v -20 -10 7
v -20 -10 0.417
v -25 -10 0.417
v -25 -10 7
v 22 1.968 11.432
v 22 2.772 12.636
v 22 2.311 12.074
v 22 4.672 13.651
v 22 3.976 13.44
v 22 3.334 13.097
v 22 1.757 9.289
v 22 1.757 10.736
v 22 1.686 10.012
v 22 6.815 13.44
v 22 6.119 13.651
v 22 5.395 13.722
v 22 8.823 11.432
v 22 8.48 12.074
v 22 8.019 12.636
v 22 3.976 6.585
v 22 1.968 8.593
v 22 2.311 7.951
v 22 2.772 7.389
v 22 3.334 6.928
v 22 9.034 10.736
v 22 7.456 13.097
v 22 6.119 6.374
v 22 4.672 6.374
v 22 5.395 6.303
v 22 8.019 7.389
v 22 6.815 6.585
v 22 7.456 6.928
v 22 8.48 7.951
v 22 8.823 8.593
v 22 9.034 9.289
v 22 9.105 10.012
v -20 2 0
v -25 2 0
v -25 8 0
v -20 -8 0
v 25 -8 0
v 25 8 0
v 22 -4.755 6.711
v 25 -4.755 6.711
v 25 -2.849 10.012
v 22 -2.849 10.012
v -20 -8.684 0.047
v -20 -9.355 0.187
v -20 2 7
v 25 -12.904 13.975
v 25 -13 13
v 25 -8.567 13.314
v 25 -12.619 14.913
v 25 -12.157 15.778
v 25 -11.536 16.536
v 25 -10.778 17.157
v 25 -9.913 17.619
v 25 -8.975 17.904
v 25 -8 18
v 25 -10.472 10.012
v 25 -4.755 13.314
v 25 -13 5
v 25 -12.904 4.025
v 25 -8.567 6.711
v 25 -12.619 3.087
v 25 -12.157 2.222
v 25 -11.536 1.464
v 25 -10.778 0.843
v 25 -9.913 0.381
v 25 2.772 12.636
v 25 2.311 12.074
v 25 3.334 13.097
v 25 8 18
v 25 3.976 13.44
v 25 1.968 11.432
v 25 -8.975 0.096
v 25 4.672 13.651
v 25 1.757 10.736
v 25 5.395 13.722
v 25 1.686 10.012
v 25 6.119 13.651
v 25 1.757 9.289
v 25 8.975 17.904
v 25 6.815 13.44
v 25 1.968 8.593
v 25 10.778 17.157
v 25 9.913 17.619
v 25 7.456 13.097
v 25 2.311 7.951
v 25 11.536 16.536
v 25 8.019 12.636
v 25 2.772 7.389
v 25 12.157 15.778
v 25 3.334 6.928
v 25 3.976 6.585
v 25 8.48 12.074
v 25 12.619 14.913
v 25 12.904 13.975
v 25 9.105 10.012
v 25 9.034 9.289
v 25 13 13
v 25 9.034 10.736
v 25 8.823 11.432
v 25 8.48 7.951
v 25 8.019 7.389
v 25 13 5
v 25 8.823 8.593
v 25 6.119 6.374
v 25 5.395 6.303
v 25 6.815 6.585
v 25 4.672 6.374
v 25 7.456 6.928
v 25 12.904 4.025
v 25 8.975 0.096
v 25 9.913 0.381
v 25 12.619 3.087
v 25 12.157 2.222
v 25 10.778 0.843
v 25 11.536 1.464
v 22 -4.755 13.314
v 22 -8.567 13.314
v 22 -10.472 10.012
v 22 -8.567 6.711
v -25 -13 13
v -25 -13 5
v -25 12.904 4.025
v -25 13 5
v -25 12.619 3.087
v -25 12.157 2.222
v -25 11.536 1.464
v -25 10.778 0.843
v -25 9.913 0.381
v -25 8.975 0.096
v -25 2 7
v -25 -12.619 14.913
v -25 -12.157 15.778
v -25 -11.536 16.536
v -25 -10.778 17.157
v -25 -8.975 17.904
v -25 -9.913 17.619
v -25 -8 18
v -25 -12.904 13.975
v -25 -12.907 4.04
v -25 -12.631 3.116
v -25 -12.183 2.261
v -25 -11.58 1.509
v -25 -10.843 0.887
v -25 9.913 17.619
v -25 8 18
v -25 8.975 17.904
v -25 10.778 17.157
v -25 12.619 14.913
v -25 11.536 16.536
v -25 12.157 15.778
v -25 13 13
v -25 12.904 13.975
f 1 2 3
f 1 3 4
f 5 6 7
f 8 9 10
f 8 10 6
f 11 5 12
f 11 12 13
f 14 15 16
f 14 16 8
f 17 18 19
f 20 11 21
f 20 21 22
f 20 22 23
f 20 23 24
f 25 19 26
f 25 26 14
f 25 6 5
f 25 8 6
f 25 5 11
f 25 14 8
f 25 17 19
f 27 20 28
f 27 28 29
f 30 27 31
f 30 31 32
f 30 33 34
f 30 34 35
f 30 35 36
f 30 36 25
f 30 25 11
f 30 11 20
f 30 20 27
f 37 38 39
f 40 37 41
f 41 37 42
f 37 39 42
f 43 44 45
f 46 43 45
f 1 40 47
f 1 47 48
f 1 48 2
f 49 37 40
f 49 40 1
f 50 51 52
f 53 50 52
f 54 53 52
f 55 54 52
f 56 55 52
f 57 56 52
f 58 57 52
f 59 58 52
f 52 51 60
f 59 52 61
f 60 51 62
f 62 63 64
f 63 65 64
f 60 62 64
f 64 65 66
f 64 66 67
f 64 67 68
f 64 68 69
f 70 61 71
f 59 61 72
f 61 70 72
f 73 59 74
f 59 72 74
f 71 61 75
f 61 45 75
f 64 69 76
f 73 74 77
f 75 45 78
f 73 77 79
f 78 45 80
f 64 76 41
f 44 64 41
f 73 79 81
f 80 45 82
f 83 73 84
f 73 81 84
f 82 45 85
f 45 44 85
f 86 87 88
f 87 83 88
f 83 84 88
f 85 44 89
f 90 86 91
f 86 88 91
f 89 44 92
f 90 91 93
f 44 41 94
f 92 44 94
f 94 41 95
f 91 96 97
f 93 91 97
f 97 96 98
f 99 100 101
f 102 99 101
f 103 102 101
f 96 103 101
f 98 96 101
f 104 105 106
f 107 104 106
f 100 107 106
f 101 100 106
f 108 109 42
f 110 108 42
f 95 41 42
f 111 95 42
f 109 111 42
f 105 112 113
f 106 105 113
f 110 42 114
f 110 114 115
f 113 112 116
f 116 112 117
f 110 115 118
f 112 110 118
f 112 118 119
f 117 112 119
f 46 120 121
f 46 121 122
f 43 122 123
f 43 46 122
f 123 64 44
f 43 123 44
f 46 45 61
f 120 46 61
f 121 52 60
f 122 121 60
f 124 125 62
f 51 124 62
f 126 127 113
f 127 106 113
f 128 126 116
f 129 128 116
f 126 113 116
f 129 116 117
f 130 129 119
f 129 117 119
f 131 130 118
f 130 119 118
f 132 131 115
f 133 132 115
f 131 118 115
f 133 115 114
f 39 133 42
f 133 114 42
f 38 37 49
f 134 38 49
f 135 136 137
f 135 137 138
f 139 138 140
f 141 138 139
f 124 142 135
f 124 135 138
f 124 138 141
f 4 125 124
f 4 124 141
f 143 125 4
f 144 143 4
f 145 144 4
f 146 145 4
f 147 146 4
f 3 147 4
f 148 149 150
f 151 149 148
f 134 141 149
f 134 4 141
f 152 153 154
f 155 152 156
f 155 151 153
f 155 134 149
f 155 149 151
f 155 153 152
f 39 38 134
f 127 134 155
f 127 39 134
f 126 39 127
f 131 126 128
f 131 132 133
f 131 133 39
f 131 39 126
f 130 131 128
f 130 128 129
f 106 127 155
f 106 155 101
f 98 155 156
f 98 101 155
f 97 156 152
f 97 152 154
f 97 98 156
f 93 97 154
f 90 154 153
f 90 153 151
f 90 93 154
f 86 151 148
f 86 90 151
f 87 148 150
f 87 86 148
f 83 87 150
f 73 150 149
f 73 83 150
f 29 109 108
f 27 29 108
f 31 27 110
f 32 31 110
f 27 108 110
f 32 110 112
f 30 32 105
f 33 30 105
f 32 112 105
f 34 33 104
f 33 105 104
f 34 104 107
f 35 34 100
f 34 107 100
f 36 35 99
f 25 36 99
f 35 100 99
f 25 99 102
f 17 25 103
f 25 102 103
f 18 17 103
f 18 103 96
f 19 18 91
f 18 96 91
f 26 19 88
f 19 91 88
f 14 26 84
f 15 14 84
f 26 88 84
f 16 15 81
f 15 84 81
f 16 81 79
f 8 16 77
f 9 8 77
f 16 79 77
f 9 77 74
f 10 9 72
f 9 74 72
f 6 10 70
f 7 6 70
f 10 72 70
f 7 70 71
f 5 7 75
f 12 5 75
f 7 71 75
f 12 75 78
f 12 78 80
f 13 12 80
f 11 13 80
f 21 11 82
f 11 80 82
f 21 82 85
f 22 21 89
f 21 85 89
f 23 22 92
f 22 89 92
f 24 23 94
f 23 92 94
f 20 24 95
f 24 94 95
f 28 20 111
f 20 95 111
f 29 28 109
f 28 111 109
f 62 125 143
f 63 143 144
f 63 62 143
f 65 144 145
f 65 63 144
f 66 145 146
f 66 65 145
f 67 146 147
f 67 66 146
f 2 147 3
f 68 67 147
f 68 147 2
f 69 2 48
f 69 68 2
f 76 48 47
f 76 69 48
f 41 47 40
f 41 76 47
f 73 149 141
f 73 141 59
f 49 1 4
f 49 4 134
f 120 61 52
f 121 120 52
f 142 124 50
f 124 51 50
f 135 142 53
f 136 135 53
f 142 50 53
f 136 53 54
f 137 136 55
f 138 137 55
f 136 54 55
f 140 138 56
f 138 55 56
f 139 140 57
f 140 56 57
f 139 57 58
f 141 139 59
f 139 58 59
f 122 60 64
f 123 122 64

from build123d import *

# Parameters (mm, degrees)
SKETCH1_W           = 50
SKETCH1_H           = 26
BOSS_EXTRUDE1_DEPTH = 18
SKETCH2_R           = 3.709825946
CUT_EXTRUDE1_DEPTH  = 3
FILLET1_R           = 5
CUT_EXTRUDE4_START  = -5
SKETCH3_W           = 7
SKETCH3_H           = 6
CUT_EXTRUDE4_DEPTH  = 5


with BuildPart() as part:
    # Sketch1 → Boss-Extrude1 (new body)
    with BuildSketch(Plane.XY):
        Rectangle(SKETCH1_W, SKETCH1_H)
    extrude(amount=BOSS_EXTRUDE1_DEPTH)

    # Sketch2 → Cut-Extrude1 (cut)
    with BuildSketch(Plane(origin=(25, 0, 0), x_dir=(0, 0, -1), z_dir=(1, 0, 0))):
        with Locations((-10.012439419, 5.395426064)):
            Circle(SKETCH2_R)
        Polygon((-10.012439419, -2.84865676), (-13.313646894, -4.754609784), (-13.313646894, -8.566515832), (-10.012439419, -10.472468856), (-6.711231945, -8.566515832), (-6.711231945, -4.754609784), align=None)
    extrude(amount=-CUT_EXTRUDE1_DEPTH, mode=Mode.SUBTRACT)

    # Fillet1
    fillet1_edges = [part.edges().sort_by_distance(p)[0] for p in [
        (0, -13, 18),
        (0, -13, 0),
        (0, 13, 0),
        (0, 13, 18),
    ]]
    fillet(fillet1_edges, radius=FILLET1_R)

    # Sketch3 → Cut-Extrude4 (cut)
    with BuildSketch(Plane.ZY.offset(25).offset(CUT_EXTRUDE4_START)):
        with BuildLine():
            Line((7, -4), (0, -4))
            Line((0, -4), (0, -8))
            ThreePointArc((0, -8), (0.105468435, -9.021548218), (0.417424305, -10))
            Line((0.417424305, -10), (7, -10))
            Line((7, -10), (7, -4))
        make_face()
        with Locations((3.5, -1)):
            Rectangle(SKETCH3_W, SKETCH3_H)
    extrude(amount=CUT_EXTRUDE4_DEPTH, mode=Mode.SUBTRACT)


solid = part.part
